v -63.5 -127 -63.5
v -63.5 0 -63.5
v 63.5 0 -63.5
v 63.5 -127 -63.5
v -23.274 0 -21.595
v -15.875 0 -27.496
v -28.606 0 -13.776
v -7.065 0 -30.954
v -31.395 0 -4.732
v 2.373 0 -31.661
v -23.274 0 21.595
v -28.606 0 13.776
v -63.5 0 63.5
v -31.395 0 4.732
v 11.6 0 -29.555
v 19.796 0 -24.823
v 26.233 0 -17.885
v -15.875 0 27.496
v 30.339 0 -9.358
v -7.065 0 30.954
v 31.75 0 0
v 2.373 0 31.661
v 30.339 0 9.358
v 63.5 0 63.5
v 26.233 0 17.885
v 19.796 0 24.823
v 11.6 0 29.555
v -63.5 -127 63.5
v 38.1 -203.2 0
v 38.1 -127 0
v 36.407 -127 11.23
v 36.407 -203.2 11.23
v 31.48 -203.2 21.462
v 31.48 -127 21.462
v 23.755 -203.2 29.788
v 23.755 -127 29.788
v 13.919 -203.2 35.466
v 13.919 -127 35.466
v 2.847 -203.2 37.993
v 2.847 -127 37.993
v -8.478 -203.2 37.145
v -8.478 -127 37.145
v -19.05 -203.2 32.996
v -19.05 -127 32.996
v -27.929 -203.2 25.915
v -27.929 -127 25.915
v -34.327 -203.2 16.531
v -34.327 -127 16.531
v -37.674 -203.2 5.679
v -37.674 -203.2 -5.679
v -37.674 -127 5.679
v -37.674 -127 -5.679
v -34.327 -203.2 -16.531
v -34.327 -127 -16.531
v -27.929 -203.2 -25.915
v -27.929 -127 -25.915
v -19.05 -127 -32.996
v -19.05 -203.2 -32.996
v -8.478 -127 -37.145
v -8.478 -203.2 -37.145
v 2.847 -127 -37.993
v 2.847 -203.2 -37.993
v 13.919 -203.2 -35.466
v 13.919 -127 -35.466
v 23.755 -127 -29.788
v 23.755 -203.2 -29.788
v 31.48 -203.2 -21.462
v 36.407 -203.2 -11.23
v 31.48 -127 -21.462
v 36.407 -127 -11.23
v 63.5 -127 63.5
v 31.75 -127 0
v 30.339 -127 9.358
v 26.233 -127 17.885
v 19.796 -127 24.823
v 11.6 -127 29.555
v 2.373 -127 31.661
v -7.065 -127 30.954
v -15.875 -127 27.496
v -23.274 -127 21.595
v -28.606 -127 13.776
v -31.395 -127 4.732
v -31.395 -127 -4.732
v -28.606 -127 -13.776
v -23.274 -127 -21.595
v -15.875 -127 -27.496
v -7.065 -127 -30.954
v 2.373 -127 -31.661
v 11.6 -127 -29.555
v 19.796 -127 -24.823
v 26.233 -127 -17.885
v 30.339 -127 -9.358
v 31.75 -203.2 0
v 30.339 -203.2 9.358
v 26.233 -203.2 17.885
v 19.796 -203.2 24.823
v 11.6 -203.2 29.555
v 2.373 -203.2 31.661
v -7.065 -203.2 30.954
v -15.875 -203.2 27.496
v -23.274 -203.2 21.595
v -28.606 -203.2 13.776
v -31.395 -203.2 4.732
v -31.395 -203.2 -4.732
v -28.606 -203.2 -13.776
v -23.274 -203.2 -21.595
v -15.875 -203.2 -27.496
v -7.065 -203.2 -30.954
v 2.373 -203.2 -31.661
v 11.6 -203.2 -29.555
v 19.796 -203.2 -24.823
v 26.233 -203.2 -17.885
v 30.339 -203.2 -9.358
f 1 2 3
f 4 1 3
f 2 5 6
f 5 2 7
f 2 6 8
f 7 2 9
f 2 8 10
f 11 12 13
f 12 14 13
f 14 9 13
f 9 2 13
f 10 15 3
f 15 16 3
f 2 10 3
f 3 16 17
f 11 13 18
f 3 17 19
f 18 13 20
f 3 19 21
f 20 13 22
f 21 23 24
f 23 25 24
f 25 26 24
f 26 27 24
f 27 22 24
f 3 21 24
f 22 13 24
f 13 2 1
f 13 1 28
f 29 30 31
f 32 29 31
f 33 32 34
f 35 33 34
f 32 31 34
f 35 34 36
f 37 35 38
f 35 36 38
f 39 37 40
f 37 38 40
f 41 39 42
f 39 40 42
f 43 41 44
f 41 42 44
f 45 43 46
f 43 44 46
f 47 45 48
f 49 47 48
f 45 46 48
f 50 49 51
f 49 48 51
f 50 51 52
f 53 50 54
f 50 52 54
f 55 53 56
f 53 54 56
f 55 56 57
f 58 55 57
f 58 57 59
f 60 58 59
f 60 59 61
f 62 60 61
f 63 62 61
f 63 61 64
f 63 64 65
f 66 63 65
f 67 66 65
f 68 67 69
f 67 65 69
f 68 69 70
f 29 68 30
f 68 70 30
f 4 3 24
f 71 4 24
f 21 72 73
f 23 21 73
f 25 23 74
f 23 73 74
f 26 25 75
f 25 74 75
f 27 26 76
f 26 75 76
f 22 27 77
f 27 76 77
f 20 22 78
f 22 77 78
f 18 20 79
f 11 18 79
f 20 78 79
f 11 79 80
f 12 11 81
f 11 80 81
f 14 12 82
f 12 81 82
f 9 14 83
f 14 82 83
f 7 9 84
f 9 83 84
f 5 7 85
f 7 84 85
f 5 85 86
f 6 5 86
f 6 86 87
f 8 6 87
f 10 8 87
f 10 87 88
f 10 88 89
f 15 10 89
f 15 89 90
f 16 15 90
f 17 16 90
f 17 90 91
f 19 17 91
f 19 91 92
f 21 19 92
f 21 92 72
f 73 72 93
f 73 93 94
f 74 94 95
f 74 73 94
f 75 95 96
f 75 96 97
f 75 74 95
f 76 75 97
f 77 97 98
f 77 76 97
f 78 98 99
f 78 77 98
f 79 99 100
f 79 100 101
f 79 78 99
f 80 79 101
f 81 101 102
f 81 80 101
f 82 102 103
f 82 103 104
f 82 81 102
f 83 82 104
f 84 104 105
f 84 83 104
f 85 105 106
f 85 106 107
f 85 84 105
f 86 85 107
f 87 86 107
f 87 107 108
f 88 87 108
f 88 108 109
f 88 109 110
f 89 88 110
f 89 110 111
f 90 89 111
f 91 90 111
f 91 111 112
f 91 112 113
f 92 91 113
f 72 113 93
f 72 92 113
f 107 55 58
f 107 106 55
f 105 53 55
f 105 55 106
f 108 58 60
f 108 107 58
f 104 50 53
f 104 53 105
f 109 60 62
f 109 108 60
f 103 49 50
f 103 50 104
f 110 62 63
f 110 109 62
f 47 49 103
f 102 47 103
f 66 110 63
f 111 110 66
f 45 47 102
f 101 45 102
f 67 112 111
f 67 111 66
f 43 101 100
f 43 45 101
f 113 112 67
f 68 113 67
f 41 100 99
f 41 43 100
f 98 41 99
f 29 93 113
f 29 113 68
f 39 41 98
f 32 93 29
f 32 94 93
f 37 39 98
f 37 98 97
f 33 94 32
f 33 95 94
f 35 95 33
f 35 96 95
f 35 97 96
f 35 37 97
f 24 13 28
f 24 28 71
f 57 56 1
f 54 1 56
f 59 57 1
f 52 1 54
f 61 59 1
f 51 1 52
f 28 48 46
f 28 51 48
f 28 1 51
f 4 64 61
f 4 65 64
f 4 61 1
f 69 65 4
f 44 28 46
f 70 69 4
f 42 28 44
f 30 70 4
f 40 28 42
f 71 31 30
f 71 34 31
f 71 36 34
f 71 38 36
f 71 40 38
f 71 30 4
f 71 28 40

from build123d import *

# Parameters (mm, degrees)
F0_W     = 127
F0_H     = 127
F1_DEPTH = 127
F2_R     = 31.75
F3_DEPTH = 127.001
F4_R     = 38.1
F4_R_2   = 31.75
F5_DEPTH = 76.2


with BuildPart() as f1:
    # F0 (on Front) → F1 (new body)
    with BuildSketch(Plane.XZ):
        Rectangle(F0_W, F0_H)
    extrude(amount=F1_DEPTH)

    # F2 (on face) → F3 (cut, through all)
    with BuildSketch(Plane.XZ.offset(127)):
        Circle(F2_R)
    extrude(amount=-F3_DEPTH, mode=Mode.SUBTRACT)

    # F4 (on face) → F5 (join)
    with BuildSketch(Plane.XZ.offset(127)):
        Circle(F4_R)
        Circle(F4_R_2, mode=Mode.SUBTRACT)
    extrude(amount=F5_DEPTH)


solid = f1.part
